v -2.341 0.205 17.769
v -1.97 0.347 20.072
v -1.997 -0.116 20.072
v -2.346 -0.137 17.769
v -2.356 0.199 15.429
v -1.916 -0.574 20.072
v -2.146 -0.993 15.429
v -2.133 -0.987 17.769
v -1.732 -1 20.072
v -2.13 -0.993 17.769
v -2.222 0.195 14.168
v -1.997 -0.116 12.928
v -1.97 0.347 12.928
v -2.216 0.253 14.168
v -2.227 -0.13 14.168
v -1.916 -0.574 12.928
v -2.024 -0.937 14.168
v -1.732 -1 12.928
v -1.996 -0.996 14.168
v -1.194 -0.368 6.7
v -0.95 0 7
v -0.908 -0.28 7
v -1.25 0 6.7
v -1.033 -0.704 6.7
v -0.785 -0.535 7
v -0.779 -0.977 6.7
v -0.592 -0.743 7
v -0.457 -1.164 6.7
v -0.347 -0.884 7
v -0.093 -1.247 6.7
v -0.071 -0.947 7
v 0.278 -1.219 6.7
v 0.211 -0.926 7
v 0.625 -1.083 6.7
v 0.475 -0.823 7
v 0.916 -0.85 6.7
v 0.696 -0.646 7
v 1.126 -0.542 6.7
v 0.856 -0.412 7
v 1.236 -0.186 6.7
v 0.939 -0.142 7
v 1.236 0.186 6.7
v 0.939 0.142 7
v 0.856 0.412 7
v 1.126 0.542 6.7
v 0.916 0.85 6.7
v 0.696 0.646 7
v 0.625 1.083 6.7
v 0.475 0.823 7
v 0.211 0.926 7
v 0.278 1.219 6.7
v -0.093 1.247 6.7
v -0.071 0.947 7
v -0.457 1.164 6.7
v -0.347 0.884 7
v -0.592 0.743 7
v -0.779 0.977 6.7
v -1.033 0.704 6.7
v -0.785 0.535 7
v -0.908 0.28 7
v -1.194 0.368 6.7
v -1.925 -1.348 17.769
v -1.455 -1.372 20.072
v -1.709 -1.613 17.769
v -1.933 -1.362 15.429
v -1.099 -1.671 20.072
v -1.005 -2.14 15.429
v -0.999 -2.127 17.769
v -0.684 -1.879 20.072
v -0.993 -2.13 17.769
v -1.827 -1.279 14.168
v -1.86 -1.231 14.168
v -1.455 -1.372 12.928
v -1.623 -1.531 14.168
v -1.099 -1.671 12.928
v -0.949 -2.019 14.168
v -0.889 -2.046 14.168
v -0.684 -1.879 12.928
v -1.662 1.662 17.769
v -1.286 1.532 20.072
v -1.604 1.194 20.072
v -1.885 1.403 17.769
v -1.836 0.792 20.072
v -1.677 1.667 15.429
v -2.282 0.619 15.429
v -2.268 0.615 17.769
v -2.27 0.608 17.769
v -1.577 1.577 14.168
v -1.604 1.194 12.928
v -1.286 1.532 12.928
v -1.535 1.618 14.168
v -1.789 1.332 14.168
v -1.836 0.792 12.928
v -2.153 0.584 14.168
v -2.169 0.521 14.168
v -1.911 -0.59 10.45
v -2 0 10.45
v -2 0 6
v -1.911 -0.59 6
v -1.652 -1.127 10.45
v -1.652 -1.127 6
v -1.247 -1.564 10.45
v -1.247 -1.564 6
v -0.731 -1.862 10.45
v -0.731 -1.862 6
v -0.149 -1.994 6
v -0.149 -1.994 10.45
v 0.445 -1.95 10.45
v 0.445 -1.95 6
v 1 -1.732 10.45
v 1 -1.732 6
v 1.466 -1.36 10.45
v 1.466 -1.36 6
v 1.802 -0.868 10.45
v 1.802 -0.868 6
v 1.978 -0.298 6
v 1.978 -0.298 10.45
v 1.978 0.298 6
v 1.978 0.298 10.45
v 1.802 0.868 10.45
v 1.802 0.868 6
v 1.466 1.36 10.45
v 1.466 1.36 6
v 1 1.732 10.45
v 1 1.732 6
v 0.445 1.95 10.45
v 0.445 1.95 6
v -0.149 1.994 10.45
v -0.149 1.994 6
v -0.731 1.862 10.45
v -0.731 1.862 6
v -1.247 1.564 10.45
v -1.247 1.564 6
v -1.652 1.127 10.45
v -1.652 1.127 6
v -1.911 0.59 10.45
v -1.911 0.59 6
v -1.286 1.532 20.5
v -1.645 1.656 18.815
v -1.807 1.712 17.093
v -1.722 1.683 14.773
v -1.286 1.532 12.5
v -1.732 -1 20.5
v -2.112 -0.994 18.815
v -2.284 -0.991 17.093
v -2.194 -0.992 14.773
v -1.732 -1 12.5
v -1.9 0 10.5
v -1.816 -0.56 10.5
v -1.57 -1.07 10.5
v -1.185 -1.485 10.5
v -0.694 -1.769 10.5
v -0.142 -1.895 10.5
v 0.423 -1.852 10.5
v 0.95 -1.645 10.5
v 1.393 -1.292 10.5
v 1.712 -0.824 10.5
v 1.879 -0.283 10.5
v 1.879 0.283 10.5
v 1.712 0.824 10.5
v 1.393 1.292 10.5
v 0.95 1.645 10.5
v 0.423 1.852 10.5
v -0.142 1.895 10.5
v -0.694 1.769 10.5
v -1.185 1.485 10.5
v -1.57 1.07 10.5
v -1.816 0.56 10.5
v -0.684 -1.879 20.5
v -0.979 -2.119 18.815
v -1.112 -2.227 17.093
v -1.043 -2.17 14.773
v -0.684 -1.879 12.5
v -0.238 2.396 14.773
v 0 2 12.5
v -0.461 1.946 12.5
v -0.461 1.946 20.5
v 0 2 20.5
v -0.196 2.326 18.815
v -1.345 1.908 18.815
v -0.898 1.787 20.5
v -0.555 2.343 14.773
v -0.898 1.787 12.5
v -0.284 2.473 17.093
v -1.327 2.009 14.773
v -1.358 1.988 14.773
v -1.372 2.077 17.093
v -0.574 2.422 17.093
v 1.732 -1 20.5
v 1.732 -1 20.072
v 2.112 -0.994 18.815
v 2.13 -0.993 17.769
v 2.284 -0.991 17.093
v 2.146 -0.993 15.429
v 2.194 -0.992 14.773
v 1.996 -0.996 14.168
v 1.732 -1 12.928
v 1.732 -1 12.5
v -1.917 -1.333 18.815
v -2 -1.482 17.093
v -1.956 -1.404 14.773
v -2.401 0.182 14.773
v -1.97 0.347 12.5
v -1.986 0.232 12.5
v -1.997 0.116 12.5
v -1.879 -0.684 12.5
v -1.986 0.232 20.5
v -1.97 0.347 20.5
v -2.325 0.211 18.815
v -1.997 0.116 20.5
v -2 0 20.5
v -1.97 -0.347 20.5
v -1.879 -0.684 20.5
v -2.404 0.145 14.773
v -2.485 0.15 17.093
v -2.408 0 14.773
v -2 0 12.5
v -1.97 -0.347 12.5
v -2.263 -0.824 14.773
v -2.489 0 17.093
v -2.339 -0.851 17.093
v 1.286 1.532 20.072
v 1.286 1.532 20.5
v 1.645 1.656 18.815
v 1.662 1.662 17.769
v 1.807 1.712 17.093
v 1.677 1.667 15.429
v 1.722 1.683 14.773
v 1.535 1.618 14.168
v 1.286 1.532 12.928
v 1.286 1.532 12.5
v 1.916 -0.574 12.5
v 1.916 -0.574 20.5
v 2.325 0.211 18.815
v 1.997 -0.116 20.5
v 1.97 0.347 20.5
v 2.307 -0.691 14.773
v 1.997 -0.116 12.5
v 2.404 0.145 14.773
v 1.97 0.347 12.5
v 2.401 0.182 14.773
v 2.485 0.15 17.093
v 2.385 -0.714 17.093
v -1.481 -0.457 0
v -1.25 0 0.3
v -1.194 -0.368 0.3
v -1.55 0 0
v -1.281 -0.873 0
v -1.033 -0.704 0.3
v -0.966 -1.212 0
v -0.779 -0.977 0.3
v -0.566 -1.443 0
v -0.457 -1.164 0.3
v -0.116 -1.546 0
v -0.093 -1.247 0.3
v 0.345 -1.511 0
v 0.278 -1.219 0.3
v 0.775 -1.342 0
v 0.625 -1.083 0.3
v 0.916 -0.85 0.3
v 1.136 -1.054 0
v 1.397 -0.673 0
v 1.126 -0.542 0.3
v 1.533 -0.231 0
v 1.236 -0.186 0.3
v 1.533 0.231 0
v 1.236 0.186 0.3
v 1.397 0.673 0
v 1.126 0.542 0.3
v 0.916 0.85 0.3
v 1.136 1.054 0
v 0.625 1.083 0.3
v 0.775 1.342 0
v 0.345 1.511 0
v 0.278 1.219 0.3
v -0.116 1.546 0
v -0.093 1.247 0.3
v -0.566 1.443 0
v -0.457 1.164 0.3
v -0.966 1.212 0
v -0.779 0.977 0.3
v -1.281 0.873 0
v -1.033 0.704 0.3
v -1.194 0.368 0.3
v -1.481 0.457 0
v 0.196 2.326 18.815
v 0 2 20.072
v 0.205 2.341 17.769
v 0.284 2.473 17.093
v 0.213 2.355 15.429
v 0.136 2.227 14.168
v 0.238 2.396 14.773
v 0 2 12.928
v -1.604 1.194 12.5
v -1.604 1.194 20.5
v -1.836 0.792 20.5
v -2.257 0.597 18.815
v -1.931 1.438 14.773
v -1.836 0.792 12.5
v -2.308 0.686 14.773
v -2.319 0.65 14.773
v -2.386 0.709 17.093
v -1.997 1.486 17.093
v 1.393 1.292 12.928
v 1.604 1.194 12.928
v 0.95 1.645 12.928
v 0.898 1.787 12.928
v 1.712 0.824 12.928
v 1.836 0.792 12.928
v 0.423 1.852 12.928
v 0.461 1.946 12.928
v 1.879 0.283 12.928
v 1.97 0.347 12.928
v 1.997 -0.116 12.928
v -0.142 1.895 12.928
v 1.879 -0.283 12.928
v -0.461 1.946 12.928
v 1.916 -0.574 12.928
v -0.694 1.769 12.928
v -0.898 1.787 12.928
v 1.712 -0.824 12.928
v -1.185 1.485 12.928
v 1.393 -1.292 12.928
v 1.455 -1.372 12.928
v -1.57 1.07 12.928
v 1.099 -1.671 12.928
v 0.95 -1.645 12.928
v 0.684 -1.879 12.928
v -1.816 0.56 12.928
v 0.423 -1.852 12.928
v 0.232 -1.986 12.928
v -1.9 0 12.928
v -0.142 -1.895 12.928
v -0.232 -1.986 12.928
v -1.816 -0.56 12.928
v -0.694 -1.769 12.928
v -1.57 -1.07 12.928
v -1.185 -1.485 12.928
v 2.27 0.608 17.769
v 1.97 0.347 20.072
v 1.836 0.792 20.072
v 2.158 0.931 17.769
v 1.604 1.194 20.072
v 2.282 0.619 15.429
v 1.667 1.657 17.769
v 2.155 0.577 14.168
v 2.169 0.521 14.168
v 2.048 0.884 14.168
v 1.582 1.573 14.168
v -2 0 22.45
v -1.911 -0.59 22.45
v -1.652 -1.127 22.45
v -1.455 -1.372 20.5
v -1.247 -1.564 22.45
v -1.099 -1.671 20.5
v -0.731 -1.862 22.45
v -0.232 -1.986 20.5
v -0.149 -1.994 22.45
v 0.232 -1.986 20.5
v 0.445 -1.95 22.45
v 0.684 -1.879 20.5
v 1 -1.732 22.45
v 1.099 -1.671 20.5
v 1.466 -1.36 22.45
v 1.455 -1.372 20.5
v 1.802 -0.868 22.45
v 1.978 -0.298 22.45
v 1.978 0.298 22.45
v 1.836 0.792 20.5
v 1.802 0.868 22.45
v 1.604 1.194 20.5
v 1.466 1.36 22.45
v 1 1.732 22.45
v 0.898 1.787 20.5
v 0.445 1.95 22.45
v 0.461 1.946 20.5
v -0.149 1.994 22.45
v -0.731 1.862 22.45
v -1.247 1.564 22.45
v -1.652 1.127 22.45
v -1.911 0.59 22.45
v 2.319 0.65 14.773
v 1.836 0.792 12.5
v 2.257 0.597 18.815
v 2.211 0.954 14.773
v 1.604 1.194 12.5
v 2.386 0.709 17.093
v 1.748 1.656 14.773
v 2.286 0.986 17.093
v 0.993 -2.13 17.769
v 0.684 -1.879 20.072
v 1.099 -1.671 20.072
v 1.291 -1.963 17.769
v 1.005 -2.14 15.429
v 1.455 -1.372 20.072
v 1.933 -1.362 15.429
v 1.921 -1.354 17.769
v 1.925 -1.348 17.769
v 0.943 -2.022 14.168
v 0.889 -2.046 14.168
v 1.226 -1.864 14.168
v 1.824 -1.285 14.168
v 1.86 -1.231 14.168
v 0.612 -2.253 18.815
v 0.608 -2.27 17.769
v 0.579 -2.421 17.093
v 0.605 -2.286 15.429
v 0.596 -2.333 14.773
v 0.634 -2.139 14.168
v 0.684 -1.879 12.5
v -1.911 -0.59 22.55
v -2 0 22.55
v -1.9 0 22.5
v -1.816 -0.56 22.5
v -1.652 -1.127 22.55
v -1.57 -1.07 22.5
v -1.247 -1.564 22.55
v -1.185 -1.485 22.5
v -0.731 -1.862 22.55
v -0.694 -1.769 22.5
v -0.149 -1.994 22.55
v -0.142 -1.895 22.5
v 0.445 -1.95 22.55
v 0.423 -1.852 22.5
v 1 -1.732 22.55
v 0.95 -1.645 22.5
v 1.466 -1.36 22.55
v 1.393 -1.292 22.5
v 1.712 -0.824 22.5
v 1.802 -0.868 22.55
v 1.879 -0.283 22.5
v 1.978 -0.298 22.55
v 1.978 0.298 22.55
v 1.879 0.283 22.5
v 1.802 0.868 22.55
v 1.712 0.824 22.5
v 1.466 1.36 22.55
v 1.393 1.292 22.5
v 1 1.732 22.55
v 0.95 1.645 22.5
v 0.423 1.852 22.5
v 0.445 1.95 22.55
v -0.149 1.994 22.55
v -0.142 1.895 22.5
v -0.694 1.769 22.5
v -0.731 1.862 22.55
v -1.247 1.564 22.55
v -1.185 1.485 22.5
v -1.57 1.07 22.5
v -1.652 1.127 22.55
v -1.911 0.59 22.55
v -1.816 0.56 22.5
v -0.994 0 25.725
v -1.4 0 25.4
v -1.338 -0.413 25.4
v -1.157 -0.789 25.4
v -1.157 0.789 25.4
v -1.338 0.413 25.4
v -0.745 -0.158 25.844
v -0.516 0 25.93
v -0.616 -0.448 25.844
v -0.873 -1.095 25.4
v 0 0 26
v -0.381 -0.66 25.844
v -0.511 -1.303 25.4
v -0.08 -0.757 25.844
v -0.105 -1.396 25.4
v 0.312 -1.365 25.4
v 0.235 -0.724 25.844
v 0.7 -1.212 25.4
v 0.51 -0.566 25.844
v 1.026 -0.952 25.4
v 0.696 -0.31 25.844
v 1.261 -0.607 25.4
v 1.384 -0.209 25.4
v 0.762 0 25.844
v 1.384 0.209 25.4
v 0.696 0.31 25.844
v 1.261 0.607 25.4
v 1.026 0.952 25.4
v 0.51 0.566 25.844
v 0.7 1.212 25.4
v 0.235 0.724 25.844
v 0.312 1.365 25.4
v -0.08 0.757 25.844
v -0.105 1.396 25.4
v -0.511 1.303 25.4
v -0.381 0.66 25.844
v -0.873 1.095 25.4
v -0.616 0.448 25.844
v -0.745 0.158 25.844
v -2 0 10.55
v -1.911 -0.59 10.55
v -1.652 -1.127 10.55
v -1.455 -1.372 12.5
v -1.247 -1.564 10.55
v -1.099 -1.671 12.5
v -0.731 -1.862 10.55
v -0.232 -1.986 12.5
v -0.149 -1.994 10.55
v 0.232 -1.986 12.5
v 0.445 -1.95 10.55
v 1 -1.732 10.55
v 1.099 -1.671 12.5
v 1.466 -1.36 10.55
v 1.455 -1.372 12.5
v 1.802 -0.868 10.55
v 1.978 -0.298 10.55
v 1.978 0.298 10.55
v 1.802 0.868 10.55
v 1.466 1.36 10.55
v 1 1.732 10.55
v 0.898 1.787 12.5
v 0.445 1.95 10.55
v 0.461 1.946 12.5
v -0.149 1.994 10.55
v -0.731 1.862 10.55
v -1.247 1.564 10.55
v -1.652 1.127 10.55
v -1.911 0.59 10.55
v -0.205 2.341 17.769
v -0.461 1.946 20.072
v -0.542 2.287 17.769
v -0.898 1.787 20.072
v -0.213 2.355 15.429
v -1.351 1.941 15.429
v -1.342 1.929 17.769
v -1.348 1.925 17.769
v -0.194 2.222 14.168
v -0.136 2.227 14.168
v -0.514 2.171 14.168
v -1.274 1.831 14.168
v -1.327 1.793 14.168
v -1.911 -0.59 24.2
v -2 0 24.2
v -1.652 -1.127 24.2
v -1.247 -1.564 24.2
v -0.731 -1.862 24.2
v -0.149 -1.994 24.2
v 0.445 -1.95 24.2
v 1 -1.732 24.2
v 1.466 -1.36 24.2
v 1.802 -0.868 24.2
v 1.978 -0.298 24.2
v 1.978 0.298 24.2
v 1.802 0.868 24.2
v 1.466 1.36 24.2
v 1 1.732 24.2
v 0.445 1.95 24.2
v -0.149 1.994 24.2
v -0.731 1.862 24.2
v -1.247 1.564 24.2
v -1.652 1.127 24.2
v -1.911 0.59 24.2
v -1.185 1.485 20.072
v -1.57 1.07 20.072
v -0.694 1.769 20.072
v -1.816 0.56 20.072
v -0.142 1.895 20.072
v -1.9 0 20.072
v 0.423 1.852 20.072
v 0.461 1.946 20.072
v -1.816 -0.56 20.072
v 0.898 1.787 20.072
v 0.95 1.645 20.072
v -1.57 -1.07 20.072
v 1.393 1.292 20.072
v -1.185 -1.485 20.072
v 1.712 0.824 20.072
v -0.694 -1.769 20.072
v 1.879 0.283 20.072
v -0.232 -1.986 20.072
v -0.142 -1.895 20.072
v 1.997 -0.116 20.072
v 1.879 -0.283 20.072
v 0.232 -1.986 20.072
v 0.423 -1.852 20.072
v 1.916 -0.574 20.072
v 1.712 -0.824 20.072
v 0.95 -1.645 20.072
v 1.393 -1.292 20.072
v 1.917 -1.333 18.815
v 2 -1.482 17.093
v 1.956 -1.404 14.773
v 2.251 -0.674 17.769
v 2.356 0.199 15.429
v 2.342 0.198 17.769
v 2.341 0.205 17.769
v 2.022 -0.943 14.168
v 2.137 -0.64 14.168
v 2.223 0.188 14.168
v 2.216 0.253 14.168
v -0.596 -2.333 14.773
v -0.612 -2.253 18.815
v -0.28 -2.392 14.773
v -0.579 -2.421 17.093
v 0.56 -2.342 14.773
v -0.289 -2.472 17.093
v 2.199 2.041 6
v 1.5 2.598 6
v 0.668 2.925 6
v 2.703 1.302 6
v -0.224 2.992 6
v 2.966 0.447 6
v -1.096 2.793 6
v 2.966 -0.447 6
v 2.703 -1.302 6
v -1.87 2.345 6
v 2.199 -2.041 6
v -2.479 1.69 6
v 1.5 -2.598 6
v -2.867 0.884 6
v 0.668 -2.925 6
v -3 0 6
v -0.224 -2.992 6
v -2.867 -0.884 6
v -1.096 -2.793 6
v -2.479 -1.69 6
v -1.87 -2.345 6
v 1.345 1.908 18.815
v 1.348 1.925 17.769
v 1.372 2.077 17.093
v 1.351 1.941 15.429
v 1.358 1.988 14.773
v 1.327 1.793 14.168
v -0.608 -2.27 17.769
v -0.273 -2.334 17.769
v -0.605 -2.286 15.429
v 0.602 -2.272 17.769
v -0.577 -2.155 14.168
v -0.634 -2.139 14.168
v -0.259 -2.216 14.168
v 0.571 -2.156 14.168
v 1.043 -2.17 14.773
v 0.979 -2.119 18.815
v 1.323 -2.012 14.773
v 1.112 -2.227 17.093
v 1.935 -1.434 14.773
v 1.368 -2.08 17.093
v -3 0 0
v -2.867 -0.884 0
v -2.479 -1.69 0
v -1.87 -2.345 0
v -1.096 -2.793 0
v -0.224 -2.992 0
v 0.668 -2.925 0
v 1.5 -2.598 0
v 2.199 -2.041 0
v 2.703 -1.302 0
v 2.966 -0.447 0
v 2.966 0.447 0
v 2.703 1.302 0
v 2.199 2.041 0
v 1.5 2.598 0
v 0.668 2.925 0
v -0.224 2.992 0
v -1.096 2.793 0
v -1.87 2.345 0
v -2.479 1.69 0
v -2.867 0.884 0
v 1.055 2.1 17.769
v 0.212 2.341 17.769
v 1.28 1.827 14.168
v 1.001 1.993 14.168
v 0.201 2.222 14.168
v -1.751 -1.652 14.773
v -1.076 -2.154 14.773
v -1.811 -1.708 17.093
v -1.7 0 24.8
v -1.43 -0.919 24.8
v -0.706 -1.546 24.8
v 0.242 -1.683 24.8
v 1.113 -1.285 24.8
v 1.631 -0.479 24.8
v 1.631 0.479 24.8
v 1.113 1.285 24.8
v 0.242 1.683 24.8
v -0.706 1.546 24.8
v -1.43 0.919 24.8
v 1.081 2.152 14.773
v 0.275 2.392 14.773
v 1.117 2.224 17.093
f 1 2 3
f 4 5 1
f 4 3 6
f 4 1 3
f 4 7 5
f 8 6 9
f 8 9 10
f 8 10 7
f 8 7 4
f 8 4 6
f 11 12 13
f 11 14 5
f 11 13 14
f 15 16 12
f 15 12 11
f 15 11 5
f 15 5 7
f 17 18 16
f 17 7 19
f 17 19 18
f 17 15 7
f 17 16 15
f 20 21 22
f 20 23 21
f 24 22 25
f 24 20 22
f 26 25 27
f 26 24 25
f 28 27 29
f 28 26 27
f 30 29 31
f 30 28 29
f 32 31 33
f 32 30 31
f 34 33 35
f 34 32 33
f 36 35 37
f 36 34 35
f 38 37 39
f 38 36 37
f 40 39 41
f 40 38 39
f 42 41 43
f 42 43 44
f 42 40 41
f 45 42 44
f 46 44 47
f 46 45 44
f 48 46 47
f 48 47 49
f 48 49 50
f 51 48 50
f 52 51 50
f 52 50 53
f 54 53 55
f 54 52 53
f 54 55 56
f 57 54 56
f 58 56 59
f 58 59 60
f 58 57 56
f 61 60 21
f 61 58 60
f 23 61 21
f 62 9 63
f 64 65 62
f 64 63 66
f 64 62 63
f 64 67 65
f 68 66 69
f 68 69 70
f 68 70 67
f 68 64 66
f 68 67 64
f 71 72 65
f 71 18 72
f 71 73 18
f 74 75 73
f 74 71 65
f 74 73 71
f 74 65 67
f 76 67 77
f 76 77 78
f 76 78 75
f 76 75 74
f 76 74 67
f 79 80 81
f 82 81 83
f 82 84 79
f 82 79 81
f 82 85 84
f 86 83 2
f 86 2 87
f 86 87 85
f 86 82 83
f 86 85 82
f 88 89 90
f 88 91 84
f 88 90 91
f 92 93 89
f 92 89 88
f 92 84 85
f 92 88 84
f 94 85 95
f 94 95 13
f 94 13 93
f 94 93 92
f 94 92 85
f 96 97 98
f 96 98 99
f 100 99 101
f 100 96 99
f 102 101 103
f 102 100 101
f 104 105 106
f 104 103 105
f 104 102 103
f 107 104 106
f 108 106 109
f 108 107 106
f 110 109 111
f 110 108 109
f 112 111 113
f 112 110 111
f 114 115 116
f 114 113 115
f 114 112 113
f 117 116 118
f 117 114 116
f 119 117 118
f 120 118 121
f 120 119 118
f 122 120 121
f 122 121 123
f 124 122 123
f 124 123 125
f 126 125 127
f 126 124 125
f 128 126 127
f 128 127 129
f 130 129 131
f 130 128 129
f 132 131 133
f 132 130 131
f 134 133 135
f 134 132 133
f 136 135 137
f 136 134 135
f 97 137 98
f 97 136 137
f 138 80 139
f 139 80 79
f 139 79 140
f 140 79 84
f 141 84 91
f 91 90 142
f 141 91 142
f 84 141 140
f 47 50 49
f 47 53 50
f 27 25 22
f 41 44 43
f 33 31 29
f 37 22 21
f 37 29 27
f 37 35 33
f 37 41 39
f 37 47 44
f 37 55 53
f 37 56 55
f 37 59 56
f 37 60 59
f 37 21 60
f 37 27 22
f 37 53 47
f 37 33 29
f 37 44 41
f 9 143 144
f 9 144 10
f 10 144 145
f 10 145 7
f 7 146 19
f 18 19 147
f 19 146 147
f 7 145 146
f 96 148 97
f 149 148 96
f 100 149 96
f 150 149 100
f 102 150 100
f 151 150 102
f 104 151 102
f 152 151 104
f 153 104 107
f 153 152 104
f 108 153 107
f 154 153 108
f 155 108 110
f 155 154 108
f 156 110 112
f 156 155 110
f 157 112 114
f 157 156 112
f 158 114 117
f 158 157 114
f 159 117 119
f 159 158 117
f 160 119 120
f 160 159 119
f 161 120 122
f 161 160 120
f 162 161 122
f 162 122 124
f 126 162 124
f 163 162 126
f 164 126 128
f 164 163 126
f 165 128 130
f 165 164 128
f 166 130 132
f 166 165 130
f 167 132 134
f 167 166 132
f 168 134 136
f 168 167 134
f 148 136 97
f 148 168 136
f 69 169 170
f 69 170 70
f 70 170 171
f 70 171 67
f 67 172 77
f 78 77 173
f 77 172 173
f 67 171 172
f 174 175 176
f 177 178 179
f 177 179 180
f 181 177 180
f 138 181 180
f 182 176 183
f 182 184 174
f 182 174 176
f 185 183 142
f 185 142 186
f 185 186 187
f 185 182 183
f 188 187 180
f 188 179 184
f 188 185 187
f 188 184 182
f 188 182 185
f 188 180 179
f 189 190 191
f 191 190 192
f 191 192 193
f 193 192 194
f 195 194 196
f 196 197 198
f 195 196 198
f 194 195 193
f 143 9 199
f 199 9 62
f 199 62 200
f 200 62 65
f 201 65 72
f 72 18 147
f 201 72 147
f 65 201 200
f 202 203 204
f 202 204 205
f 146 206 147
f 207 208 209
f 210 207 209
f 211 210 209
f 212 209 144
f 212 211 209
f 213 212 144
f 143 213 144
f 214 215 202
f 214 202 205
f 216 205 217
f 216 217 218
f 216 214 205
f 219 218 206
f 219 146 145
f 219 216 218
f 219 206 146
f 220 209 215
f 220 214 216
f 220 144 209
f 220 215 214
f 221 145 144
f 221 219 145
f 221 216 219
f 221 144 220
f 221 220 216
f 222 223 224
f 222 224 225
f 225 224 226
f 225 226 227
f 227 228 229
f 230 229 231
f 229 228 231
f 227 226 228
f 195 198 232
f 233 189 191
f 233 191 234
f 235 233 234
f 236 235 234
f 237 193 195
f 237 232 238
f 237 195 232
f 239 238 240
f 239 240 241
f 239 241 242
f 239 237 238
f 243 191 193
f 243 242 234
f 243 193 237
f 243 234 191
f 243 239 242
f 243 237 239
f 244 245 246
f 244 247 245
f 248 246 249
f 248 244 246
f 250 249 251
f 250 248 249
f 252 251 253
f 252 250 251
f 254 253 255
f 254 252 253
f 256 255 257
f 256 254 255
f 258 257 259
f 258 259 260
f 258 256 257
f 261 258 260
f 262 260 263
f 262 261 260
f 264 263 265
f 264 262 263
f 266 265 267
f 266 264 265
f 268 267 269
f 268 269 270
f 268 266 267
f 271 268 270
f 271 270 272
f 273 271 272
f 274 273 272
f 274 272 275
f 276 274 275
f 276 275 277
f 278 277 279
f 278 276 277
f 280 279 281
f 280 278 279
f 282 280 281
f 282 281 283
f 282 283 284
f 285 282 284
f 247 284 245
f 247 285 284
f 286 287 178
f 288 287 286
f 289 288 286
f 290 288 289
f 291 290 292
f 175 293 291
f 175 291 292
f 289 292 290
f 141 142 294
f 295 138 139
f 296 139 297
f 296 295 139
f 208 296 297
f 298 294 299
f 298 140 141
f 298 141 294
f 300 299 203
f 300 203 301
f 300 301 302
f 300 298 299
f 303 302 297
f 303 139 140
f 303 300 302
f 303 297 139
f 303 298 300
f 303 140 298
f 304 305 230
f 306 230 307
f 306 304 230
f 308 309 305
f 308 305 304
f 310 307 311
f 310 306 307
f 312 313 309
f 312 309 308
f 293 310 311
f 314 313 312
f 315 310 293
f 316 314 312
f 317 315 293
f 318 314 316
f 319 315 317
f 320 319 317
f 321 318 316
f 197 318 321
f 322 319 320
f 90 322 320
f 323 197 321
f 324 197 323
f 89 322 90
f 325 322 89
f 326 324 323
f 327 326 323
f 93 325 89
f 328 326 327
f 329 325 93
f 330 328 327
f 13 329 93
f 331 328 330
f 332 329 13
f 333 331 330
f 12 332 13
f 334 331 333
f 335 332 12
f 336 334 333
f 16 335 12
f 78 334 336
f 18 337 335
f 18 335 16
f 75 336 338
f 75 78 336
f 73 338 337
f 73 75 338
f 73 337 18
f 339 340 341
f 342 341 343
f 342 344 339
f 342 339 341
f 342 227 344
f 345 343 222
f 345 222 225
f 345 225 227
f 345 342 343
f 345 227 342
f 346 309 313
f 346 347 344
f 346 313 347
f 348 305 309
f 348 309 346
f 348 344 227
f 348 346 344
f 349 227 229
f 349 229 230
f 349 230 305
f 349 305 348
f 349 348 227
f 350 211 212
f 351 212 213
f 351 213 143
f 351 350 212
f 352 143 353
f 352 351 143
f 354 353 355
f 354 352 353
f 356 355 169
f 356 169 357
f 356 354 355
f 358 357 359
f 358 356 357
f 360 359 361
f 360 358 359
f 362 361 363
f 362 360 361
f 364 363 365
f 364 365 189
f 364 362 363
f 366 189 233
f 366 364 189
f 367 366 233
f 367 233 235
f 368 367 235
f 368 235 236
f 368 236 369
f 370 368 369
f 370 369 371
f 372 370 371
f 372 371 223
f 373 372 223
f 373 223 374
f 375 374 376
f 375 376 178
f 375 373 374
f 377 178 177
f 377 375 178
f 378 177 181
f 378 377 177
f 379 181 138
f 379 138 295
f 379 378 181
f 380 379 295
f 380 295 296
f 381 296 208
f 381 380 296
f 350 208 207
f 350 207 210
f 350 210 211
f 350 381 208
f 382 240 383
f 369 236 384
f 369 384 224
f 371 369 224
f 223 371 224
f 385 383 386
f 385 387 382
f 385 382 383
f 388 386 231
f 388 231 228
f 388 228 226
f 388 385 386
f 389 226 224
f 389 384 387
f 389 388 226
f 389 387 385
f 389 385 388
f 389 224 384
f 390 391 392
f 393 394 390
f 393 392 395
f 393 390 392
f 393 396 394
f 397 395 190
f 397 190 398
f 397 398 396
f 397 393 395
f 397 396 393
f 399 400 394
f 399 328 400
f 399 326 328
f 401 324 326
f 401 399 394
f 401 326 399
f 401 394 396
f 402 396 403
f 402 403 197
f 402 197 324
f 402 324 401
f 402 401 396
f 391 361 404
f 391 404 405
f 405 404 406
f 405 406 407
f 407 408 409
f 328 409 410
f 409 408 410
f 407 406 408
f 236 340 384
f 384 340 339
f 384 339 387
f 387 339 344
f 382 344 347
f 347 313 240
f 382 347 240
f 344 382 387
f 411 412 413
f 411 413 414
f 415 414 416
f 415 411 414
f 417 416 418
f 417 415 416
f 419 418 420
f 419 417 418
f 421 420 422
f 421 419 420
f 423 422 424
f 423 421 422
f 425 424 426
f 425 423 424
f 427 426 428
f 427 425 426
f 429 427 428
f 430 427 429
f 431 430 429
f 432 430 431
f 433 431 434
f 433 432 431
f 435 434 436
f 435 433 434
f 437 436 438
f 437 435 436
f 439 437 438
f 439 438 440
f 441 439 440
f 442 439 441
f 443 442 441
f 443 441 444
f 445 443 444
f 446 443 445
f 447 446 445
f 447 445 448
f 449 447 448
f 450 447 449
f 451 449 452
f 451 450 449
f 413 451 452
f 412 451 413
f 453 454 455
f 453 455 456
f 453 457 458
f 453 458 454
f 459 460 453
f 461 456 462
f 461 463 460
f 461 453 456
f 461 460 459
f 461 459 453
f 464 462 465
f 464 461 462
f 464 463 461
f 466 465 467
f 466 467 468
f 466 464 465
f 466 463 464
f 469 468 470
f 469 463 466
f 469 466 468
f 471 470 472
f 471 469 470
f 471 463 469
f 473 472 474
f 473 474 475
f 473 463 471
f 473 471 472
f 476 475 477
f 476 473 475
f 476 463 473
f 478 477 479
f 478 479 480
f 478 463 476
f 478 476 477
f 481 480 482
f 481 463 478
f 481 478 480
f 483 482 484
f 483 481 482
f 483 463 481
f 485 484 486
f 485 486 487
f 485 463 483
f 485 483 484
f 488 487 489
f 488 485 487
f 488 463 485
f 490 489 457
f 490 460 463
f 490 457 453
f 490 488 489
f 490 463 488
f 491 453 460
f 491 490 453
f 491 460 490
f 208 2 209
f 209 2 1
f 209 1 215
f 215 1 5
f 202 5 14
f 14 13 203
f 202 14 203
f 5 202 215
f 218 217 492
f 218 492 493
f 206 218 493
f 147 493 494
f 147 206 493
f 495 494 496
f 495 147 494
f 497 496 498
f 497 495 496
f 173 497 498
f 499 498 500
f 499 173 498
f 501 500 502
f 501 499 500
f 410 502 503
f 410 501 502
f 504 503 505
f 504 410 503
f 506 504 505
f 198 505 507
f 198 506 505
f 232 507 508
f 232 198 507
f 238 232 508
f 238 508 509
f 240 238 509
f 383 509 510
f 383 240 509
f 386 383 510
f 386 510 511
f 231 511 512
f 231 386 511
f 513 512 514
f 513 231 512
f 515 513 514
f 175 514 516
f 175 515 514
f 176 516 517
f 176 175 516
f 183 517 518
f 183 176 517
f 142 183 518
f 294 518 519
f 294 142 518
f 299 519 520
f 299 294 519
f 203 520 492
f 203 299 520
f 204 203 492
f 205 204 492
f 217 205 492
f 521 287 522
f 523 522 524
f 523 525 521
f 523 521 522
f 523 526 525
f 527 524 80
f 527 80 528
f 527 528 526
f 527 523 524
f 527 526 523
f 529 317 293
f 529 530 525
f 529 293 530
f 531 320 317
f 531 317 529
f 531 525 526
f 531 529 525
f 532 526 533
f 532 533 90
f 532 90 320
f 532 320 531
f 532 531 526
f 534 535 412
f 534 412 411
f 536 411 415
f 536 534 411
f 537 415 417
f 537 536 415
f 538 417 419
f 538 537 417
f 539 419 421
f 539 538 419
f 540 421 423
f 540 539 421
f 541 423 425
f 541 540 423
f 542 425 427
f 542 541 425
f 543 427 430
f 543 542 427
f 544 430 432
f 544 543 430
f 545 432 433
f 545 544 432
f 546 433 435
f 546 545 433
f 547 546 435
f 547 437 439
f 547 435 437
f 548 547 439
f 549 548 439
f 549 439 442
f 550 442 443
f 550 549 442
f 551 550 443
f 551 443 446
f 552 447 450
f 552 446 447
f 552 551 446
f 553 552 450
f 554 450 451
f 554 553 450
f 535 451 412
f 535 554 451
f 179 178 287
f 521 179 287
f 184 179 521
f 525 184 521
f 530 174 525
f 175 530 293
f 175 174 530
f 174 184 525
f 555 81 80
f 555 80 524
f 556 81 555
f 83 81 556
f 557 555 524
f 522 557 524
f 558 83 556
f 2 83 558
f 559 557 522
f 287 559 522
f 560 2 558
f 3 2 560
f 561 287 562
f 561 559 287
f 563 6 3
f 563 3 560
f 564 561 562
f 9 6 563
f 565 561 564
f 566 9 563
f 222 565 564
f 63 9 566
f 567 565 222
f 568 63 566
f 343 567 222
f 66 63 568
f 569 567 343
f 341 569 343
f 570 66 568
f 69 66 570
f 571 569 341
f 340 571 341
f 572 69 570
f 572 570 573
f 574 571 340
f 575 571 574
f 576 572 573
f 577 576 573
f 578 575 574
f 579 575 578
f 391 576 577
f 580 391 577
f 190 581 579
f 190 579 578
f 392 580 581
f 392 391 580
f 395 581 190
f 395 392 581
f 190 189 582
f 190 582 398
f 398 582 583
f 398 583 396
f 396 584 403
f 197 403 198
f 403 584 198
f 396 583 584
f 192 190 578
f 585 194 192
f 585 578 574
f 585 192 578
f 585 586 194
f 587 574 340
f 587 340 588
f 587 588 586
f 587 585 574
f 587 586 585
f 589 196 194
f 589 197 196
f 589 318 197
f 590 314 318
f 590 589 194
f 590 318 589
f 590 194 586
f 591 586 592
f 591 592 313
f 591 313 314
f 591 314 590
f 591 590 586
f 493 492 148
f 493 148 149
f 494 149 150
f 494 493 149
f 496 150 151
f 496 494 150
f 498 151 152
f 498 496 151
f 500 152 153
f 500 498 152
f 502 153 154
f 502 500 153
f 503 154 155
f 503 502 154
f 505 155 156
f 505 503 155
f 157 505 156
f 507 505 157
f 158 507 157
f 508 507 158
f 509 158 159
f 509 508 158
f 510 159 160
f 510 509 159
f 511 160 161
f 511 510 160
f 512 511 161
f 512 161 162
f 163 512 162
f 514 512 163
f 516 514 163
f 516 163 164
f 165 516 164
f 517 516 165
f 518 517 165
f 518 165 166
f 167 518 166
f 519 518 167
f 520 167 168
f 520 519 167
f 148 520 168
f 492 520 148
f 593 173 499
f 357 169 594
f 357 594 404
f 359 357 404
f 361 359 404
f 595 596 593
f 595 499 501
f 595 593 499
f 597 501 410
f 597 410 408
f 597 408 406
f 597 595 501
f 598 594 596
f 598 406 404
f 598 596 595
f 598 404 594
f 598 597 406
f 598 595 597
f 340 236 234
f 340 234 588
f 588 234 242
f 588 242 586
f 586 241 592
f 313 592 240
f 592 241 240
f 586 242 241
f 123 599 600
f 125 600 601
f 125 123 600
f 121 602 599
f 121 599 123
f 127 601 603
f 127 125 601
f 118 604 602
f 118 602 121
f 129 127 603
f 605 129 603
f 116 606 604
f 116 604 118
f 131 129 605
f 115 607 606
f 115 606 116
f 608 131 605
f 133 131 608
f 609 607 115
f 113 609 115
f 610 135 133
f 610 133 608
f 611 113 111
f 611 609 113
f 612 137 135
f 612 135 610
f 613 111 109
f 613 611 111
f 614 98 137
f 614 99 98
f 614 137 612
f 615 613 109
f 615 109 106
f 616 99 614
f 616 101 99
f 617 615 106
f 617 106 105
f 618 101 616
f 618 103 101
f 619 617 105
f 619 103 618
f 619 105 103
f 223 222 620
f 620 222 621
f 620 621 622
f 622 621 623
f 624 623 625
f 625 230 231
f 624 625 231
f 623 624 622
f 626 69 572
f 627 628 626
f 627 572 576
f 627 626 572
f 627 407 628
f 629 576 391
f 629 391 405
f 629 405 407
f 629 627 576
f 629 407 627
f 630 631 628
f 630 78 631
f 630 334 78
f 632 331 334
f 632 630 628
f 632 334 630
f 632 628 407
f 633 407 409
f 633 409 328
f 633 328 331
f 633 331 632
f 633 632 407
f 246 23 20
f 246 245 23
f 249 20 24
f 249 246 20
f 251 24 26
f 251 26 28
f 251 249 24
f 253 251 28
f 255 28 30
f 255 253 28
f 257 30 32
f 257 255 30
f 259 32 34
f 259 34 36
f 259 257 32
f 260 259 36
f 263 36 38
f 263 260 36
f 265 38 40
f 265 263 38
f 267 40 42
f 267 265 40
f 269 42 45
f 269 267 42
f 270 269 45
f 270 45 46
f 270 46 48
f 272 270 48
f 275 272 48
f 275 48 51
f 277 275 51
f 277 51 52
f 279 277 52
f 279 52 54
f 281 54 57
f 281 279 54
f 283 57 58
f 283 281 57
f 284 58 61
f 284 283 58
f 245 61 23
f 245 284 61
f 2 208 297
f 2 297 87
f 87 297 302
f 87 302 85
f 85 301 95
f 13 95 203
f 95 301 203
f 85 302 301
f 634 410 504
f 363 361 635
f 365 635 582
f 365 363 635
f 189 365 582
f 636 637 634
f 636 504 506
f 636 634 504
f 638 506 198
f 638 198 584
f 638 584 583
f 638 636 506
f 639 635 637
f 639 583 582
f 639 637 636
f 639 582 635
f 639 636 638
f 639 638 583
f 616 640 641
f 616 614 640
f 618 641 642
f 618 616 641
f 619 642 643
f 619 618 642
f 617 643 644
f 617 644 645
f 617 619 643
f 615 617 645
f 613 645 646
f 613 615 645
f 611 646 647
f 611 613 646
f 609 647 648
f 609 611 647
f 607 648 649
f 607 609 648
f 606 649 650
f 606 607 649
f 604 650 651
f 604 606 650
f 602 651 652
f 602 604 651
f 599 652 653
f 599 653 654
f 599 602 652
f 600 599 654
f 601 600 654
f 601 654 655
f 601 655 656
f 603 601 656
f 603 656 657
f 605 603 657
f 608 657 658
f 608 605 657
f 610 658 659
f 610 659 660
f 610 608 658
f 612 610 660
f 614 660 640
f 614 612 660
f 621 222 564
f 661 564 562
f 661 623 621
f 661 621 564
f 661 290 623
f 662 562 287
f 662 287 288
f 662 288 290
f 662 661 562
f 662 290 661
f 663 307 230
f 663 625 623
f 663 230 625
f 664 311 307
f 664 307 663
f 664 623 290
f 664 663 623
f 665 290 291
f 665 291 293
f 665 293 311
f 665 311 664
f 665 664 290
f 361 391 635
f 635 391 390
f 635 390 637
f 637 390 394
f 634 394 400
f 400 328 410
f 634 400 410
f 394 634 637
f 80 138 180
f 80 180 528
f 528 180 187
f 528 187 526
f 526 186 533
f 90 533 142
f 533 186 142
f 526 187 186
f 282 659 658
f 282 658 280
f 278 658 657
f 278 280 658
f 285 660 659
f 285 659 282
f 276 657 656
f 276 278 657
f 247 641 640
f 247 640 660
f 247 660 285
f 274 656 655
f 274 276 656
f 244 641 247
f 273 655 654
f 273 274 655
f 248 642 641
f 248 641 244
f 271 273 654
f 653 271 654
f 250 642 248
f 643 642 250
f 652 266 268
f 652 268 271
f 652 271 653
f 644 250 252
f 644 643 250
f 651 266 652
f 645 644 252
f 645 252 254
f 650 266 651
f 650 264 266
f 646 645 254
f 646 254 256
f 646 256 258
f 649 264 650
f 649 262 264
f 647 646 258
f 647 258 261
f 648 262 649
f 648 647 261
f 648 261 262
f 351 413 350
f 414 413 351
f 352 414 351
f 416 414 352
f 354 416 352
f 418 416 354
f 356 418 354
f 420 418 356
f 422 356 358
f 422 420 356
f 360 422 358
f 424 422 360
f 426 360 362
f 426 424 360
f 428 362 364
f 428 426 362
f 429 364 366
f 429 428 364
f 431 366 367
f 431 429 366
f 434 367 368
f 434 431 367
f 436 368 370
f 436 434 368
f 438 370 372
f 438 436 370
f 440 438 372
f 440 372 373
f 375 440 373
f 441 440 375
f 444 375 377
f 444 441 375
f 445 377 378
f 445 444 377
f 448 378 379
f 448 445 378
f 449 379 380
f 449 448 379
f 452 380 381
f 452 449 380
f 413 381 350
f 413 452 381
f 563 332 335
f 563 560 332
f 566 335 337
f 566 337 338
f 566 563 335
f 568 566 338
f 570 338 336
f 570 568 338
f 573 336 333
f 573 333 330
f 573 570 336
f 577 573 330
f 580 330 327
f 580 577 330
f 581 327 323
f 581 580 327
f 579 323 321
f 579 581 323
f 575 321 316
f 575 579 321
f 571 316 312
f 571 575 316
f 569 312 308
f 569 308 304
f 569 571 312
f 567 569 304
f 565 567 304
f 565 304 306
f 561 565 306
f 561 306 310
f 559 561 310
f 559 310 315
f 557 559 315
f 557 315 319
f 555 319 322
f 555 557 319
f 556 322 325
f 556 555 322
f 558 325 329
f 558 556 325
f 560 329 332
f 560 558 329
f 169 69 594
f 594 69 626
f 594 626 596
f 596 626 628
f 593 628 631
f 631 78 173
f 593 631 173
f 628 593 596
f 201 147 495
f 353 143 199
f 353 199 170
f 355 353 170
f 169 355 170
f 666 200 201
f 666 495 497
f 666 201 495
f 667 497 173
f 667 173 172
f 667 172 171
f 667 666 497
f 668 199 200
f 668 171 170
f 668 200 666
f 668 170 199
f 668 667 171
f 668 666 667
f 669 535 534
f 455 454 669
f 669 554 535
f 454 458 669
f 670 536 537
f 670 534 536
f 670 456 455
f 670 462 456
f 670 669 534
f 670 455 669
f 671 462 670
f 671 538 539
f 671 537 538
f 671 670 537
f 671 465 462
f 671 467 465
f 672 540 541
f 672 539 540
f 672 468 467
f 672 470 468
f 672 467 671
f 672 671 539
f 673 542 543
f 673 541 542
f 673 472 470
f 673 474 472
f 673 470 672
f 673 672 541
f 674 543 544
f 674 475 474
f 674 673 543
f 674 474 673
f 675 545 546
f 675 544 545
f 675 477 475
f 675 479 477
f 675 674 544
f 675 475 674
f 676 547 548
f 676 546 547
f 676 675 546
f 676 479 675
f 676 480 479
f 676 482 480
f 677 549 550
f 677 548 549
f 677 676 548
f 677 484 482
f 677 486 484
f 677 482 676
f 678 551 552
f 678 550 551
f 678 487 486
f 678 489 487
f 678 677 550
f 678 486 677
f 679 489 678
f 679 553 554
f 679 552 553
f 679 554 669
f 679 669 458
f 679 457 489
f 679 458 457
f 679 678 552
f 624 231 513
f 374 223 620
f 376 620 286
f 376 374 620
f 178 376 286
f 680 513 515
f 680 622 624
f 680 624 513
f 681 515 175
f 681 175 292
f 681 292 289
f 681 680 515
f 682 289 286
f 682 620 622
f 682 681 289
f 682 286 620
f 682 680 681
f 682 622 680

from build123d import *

# Parameters (mm, degrees)
ENL_V_START             = 6
ENL_V_MAT_EXTRU_2_DEPTH = 21.343879745


with BuildPart() as part:
    # Esquisse1 → base (revolve)
    with BuildSketch(Plane(origin=(0, 0, 0), x_dir=(0, 0, -1), z_dir=(1, 0, 0)), mode=Mode.PRIVATE) as base_sk:
        with BuildLine():
            Line((0, 1.55), (0, 3))
            Line((0, 3), (-6, 3))
            Line((-6, 3), (-6, 2))
            Line((-6, 2), (-10.45, 2))
            Line((-10.45, 2), (-10.5, 1.9))
            Line((-10.5, 1.9), (-10.55, 2))
            Line((-10.55, 2), (-12.5, 2))
            ThreePointArc((-12.5, 2), (-16.5, 2.5), (-20.5, 2))
            Line((-20.5, 2), (-22.45, 2))
            Line((-22.45, 2), (-22.5, 1.9))
            Line((-22.5, 1.9), (-22.55, 2))
            Line((-22.55, 2), (-24.2, 2))
            Line((-24.2, 2), (-25.4, 1.4))
            ThreePointArc((-25.4, 1.4), (-25.843680391, 0.761577311), (-26, 0))
            Line((-26, 0), (-7, 0))
            Line((-7, 0), (-7, 0.95))
            Line((-7, 0.95), (-6.7, 1.25))
            Line((-6.7, 1.25), (-0.3, 1.25))
            Line((-0.3, 1.25), (0, 1.55))
        make_face()
        with BuildLine():
            Line((-12.92788578, 2), (-12.92788578, 1.9))
            Line((-12.92788578, 1.9), (-20.07211422, 1.9))
            Line((-20.07211422, 1.9), (-20.07211422, 2))
            ThreePointArc((-20.07211422, 2), (-16.5, 2.4), (-12.92788578, 2))
        make_face(mode=Mode.SUBTRACT)
    revolve(base_sk.sketch.rotate(Axis((0, 0, 0), (0, 0, 1)), 90), axis=Axis((0, 0, 0), (0, 0, 1)))

    # Esquisse2 → Enlèv. mat.-Extru.2 (cut, through all)
    with BuildSketch(Plane.XY.offset(ENL_V_START)):
        Polygon((0.3, 2.5), (-0.3, 2.5), (0, 2), align=None)
        Polygon((1.836782357, 1.722274825), (1.285575219, 1.532088886), (1.377155691, 2.107947391), align=None)
        Polygon((2.514113836, 0.138678118), (1.969615506, 0.347296355), (2.409924929, 0.72956277), align=None)
        Polygon((2.015063509, -1.509807621), (1.732050808, -1), (2.315063509, -0.990192379), align=None)
        Polygon((0.573142572, -2.451837595), (0.684040287, -1.879385242), (1.136958145, -2.246625509), align=None)
        Polygon((-1.136958145, -2.246625509), (-0.684040287, -1.879385242), (-0.573142572, -2.451837595), align=None)
        Polygon((-2.315063509, -0.990192379), (-1.732050808, -1), (-2.015063509, -1.509807621), align=None)
        Polygon((-2.409924929, 0.72956277), (-1.969615506, 0.347296355), (-2.514113836, 0.138678118), align=None)
        Polygon((-1.377155691, 2.107947391), (-1.285575219, 1.532088886), (-1.836782357, 1.722274825), align=None)
    extrude(amount=ENL_V_MAT_EXTRU_2_DEPTH, mode=Mode.SUBTRACT)


solid = part.part
